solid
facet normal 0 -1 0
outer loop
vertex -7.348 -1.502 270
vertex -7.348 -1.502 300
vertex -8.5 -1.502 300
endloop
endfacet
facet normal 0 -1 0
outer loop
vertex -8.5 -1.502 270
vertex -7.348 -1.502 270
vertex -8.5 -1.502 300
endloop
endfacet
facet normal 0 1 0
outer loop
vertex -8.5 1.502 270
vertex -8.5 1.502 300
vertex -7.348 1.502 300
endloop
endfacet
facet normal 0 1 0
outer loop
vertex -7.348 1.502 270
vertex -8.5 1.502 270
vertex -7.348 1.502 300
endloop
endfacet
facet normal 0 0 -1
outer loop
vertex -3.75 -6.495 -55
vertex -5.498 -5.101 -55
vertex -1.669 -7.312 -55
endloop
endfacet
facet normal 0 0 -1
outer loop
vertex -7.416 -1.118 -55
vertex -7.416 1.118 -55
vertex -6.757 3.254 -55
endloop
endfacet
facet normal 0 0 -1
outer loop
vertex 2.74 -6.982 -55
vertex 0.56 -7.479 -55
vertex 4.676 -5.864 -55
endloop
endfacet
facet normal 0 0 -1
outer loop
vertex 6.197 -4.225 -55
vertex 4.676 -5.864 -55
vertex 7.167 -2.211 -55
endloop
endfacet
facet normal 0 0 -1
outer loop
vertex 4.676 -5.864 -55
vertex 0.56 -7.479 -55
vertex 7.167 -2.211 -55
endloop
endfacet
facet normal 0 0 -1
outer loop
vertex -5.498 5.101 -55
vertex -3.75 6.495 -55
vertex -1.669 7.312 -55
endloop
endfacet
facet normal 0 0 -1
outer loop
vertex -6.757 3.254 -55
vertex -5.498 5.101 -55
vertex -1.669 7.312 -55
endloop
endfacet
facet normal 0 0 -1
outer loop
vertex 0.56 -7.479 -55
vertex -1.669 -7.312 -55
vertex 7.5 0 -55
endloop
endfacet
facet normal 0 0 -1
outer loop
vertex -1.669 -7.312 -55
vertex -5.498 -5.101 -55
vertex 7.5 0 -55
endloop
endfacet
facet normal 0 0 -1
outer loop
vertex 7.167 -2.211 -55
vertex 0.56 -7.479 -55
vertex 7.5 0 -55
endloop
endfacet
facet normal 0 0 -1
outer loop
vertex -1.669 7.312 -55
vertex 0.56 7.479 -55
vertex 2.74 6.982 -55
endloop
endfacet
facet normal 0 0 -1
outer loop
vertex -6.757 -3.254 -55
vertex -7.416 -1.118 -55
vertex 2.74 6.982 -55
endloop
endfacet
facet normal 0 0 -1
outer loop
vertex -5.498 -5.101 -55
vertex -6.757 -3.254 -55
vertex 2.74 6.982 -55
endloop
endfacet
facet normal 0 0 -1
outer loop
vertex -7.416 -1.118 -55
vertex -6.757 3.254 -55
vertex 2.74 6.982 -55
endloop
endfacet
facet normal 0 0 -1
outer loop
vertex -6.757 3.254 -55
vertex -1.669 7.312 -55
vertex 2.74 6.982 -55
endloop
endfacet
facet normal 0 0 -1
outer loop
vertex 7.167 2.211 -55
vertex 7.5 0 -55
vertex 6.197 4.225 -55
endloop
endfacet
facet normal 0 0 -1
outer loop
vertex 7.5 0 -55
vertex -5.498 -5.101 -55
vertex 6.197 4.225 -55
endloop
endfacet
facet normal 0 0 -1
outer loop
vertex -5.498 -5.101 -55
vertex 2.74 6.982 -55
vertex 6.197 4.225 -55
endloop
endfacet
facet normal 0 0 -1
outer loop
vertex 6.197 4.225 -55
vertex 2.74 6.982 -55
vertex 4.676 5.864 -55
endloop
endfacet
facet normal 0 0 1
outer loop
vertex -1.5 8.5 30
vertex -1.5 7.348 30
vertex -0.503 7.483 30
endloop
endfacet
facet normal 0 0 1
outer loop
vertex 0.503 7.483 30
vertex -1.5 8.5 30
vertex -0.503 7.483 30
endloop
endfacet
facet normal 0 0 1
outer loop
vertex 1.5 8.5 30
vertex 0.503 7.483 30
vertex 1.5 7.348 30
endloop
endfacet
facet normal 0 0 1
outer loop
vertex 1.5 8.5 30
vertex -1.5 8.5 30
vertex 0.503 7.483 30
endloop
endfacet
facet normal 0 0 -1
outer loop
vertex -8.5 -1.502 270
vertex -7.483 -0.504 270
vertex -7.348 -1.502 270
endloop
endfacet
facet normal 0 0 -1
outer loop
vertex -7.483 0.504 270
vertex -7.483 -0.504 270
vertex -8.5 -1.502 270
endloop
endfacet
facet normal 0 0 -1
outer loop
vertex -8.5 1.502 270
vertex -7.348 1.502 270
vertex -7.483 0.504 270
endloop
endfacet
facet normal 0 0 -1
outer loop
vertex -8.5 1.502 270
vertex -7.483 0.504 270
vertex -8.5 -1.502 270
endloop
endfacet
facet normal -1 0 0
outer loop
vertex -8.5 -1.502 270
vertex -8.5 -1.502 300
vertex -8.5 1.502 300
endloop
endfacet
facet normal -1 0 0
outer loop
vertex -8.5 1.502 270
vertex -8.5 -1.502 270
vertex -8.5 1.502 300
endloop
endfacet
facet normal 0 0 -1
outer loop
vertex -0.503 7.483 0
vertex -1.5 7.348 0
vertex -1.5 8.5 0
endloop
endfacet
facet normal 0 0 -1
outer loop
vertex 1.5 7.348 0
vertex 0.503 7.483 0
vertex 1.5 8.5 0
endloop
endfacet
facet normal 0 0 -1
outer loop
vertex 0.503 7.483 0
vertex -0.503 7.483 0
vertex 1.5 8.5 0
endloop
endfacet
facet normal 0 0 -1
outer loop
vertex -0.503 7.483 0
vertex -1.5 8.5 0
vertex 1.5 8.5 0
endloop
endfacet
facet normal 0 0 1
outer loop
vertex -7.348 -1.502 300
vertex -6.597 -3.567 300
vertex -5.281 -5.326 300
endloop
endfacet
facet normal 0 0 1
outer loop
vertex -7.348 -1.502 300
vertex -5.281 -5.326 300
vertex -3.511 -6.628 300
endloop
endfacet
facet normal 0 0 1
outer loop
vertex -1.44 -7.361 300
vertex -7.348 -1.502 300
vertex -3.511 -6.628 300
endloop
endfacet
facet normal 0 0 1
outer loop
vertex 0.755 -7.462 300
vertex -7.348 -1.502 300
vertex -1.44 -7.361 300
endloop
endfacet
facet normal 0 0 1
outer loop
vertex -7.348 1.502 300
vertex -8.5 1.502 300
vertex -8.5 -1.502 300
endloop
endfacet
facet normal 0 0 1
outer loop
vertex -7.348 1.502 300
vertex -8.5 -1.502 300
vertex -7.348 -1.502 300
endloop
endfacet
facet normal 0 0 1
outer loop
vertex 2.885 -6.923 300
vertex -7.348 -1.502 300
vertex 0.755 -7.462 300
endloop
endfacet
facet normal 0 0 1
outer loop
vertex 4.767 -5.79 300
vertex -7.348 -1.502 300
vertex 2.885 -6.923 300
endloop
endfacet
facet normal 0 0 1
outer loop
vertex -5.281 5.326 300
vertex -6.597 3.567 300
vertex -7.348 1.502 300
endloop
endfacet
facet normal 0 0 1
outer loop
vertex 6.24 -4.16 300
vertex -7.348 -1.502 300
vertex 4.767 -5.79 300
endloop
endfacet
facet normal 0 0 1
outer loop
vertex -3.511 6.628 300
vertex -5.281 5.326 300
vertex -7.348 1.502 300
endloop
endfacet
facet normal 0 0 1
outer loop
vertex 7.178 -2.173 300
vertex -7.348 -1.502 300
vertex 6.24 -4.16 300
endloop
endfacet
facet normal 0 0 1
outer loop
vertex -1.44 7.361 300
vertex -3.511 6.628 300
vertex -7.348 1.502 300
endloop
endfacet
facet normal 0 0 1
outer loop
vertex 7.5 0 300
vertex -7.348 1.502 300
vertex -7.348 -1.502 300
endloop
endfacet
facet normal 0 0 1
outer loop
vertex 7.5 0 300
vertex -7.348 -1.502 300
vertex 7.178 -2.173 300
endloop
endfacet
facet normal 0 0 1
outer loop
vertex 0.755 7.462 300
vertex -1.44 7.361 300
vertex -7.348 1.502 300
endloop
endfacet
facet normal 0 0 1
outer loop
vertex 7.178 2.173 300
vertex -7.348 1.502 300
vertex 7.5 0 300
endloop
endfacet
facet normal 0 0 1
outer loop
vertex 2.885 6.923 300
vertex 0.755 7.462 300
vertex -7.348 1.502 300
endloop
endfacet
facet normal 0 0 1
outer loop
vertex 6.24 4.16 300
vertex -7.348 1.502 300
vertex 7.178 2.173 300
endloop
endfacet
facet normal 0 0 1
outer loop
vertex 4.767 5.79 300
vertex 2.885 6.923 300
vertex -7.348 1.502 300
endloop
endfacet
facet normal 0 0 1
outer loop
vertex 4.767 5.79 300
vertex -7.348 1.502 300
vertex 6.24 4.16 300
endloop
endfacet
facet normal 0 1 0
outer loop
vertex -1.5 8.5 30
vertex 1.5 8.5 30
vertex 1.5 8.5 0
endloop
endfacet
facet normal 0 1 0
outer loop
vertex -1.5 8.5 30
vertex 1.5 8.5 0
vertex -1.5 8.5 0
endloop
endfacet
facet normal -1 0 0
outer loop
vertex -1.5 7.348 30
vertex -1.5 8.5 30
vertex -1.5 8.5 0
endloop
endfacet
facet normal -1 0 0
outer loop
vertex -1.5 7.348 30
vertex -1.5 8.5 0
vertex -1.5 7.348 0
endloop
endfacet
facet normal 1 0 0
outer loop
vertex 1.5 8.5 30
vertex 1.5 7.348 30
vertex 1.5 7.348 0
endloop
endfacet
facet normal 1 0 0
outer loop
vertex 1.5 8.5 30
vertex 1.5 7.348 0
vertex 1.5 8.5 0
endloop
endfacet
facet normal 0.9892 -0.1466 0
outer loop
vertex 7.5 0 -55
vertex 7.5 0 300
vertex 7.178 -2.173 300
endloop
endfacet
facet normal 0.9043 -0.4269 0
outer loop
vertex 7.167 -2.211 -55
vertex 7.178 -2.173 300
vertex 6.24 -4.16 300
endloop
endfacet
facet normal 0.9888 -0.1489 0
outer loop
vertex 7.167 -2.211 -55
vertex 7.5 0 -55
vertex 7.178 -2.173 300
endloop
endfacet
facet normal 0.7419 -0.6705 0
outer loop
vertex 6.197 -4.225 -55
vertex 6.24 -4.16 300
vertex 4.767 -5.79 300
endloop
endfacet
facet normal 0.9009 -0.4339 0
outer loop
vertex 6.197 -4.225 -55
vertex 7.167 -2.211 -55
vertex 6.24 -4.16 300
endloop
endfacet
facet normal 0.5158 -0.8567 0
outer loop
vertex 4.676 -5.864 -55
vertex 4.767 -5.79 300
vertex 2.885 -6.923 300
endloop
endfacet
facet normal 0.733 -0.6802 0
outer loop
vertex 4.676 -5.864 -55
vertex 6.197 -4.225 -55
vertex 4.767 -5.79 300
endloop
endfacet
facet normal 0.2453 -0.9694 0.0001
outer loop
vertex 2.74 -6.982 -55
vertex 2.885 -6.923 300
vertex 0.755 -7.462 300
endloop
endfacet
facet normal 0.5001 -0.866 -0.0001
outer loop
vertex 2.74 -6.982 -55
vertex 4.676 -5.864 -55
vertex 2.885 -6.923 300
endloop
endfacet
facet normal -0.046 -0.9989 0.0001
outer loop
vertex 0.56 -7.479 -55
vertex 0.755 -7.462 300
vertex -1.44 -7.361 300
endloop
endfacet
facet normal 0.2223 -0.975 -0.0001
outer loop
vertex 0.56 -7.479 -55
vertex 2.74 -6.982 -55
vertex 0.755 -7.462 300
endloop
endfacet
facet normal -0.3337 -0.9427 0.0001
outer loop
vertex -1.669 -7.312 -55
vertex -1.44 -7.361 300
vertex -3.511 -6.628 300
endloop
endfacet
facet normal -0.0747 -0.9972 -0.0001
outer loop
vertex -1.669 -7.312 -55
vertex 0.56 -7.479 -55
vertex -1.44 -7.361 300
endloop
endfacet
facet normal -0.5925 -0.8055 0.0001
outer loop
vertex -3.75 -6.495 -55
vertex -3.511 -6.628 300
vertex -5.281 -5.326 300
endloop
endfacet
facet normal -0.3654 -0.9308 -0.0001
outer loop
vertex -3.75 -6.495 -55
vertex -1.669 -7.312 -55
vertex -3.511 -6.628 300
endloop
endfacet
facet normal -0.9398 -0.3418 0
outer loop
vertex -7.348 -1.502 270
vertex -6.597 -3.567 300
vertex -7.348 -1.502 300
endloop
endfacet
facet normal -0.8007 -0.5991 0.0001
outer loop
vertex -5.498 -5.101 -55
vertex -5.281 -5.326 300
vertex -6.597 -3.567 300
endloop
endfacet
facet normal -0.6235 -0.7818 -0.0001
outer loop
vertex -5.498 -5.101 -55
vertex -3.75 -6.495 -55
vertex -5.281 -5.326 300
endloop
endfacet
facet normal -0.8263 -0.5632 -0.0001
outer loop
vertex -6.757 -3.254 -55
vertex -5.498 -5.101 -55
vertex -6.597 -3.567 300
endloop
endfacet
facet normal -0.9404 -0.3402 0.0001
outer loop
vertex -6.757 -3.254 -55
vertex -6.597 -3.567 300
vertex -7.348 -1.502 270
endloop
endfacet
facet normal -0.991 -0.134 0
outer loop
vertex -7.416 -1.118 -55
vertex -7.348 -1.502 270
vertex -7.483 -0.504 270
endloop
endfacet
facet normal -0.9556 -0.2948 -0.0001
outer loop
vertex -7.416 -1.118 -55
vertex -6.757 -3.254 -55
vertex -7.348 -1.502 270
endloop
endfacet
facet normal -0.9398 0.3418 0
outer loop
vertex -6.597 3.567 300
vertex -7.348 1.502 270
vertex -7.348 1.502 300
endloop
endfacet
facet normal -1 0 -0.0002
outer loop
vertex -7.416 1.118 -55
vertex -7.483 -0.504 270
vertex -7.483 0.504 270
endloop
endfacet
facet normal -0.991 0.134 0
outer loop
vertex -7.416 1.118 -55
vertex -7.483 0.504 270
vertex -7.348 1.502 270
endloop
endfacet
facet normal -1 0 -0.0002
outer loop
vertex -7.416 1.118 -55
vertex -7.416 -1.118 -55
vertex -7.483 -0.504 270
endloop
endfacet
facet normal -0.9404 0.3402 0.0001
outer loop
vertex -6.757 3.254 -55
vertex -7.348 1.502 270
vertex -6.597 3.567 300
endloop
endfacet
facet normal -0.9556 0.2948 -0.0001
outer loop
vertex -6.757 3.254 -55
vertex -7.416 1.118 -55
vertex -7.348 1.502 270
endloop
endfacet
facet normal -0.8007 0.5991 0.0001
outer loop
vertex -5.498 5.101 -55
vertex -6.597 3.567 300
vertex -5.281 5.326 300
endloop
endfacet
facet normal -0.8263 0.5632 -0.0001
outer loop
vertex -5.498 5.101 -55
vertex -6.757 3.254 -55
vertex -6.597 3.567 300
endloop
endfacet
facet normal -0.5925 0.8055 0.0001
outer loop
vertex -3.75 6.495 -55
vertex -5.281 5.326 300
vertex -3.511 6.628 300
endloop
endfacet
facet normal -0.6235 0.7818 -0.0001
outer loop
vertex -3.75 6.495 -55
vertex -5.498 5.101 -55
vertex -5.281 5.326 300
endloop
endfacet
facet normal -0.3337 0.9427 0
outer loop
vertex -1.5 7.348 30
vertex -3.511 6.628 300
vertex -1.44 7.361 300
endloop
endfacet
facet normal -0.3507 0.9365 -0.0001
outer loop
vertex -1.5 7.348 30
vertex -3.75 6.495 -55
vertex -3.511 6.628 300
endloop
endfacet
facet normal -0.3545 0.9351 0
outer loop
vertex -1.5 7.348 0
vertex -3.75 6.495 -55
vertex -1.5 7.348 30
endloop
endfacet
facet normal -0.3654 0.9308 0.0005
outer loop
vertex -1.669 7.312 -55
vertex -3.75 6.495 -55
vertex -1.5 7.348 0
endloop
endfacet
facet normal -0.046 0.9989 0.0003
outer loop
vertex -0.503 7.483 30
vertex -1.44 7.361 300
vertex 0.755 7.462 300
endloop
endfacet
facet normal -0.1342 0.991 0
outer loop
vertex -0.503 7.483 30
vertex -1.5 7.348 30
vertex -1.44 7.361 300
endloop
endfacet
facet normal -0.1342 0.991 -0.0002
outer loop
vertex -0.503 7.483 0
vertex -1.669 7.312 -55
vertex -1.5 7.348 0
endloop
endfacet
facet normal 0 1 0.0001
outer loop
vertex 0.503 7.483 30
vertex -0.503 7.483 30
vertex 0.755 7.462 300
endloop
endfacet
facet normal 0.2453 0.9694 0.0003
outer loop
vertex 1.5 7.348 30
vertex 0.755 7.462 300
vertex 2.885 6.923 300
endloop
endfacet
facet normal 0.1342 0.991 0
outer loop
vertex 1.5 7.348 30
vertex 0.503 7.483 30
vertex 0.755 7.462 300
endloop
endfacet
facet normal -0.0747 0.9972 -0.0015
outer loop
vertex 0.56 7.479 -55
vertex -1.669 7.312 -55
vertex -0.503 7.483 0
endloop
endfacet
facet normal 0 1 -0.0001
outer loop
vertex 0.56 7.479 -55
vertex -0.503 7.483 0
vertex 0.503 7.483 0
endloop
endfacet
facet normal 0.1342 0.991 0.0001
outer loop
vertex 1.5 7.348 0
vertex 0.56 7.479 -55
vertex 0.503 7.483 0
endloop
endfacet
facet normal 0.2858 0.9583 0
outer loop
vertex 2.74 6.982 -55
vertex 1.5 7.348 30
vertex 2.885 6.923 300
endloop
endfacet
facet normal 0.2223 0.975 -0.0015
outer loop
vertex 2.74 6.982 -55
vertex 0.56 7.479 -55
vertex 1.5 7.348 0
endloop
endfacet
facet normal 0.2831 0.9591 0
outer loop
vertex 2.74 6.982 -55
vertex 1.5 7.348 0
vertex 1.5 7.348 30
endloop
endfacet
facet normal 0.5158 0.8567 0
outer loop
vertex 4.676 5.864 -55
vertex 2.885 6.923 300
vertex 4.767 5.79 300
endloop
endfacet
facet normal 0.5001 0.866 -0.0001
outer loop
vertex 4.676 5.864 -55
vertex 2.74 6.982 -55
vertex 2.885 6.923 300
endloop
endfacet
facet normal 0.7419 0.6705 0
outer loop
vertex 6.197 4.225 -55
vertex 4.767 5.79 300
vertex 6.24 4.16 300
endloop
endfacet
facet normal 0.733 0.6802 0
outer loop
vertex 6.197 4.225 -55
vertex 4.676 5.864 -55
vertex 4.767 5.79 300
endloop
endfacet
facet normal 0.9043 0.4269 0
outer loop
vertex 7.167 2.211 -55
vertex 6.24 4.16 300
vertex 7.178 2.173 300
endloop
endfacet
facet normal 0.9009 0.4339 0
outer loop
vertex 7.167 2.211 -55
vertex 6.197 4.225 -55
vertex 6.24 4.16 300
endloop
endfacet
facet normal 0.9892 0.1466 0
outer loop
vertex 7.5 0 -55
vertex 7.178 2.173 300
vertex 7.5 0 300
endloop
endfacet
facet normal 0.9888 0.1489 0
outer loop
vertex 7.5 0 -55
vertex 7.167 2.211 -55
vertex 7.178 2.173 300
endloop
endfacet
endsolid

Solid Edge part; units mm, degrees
sketch "Sketch1" plane through (0, 0, 0) normal (0, 0, 1) x (1, 0, 0)
  circle A0 centre (0, 0) radius 7.5
  dimension "D1" = 15
extrude "ExtrudedProtrusion_1" add sketch "Sketch1" along normal blind 300 and the other way blind 55
sketch "Sketch2" plane through (0, 0, 0) normal (0, 0, 1) x (1, 0, 0)
  line L0 (-1.5, 6.5) -> (1.5, 6.5)
  line L1 (1.5, 6.5) -> (1.5, 8.5)
  line L2 (1.5, 8.5) -> (-1.5, 8.5)
  line L3 (-1.5, 8.5) -> (-1.5, 6.5)
  dimension "D1" = 6.5
  dimension "D2" = 3
extrude "ExtrudedProtrusion_2" add sketch "Sketch2" along normal blind 30
sketch "Sketch3" plane through (0, 0, 300) normal (0, 0, 1) x (0, 1, 0)
  line L0 (1.5023, 6.5) -> (-1.5023, 6.5)
  line L1 (-1.5023, 6.5) -> (-1.5023, 8.5)
  line L2 (-1.5023, 8.5) -> (1.5023, 8.5)
  line L3 (1.5023, 8.5) -> (1.5023, 6.5)
  dimension "D1" = 3.0045
  dimension "D2" = 2
  dimension "D3" = 6.5
extrude "ExtrudedProtrusion_3" add sketch "Sketch3" against normal blind 30
